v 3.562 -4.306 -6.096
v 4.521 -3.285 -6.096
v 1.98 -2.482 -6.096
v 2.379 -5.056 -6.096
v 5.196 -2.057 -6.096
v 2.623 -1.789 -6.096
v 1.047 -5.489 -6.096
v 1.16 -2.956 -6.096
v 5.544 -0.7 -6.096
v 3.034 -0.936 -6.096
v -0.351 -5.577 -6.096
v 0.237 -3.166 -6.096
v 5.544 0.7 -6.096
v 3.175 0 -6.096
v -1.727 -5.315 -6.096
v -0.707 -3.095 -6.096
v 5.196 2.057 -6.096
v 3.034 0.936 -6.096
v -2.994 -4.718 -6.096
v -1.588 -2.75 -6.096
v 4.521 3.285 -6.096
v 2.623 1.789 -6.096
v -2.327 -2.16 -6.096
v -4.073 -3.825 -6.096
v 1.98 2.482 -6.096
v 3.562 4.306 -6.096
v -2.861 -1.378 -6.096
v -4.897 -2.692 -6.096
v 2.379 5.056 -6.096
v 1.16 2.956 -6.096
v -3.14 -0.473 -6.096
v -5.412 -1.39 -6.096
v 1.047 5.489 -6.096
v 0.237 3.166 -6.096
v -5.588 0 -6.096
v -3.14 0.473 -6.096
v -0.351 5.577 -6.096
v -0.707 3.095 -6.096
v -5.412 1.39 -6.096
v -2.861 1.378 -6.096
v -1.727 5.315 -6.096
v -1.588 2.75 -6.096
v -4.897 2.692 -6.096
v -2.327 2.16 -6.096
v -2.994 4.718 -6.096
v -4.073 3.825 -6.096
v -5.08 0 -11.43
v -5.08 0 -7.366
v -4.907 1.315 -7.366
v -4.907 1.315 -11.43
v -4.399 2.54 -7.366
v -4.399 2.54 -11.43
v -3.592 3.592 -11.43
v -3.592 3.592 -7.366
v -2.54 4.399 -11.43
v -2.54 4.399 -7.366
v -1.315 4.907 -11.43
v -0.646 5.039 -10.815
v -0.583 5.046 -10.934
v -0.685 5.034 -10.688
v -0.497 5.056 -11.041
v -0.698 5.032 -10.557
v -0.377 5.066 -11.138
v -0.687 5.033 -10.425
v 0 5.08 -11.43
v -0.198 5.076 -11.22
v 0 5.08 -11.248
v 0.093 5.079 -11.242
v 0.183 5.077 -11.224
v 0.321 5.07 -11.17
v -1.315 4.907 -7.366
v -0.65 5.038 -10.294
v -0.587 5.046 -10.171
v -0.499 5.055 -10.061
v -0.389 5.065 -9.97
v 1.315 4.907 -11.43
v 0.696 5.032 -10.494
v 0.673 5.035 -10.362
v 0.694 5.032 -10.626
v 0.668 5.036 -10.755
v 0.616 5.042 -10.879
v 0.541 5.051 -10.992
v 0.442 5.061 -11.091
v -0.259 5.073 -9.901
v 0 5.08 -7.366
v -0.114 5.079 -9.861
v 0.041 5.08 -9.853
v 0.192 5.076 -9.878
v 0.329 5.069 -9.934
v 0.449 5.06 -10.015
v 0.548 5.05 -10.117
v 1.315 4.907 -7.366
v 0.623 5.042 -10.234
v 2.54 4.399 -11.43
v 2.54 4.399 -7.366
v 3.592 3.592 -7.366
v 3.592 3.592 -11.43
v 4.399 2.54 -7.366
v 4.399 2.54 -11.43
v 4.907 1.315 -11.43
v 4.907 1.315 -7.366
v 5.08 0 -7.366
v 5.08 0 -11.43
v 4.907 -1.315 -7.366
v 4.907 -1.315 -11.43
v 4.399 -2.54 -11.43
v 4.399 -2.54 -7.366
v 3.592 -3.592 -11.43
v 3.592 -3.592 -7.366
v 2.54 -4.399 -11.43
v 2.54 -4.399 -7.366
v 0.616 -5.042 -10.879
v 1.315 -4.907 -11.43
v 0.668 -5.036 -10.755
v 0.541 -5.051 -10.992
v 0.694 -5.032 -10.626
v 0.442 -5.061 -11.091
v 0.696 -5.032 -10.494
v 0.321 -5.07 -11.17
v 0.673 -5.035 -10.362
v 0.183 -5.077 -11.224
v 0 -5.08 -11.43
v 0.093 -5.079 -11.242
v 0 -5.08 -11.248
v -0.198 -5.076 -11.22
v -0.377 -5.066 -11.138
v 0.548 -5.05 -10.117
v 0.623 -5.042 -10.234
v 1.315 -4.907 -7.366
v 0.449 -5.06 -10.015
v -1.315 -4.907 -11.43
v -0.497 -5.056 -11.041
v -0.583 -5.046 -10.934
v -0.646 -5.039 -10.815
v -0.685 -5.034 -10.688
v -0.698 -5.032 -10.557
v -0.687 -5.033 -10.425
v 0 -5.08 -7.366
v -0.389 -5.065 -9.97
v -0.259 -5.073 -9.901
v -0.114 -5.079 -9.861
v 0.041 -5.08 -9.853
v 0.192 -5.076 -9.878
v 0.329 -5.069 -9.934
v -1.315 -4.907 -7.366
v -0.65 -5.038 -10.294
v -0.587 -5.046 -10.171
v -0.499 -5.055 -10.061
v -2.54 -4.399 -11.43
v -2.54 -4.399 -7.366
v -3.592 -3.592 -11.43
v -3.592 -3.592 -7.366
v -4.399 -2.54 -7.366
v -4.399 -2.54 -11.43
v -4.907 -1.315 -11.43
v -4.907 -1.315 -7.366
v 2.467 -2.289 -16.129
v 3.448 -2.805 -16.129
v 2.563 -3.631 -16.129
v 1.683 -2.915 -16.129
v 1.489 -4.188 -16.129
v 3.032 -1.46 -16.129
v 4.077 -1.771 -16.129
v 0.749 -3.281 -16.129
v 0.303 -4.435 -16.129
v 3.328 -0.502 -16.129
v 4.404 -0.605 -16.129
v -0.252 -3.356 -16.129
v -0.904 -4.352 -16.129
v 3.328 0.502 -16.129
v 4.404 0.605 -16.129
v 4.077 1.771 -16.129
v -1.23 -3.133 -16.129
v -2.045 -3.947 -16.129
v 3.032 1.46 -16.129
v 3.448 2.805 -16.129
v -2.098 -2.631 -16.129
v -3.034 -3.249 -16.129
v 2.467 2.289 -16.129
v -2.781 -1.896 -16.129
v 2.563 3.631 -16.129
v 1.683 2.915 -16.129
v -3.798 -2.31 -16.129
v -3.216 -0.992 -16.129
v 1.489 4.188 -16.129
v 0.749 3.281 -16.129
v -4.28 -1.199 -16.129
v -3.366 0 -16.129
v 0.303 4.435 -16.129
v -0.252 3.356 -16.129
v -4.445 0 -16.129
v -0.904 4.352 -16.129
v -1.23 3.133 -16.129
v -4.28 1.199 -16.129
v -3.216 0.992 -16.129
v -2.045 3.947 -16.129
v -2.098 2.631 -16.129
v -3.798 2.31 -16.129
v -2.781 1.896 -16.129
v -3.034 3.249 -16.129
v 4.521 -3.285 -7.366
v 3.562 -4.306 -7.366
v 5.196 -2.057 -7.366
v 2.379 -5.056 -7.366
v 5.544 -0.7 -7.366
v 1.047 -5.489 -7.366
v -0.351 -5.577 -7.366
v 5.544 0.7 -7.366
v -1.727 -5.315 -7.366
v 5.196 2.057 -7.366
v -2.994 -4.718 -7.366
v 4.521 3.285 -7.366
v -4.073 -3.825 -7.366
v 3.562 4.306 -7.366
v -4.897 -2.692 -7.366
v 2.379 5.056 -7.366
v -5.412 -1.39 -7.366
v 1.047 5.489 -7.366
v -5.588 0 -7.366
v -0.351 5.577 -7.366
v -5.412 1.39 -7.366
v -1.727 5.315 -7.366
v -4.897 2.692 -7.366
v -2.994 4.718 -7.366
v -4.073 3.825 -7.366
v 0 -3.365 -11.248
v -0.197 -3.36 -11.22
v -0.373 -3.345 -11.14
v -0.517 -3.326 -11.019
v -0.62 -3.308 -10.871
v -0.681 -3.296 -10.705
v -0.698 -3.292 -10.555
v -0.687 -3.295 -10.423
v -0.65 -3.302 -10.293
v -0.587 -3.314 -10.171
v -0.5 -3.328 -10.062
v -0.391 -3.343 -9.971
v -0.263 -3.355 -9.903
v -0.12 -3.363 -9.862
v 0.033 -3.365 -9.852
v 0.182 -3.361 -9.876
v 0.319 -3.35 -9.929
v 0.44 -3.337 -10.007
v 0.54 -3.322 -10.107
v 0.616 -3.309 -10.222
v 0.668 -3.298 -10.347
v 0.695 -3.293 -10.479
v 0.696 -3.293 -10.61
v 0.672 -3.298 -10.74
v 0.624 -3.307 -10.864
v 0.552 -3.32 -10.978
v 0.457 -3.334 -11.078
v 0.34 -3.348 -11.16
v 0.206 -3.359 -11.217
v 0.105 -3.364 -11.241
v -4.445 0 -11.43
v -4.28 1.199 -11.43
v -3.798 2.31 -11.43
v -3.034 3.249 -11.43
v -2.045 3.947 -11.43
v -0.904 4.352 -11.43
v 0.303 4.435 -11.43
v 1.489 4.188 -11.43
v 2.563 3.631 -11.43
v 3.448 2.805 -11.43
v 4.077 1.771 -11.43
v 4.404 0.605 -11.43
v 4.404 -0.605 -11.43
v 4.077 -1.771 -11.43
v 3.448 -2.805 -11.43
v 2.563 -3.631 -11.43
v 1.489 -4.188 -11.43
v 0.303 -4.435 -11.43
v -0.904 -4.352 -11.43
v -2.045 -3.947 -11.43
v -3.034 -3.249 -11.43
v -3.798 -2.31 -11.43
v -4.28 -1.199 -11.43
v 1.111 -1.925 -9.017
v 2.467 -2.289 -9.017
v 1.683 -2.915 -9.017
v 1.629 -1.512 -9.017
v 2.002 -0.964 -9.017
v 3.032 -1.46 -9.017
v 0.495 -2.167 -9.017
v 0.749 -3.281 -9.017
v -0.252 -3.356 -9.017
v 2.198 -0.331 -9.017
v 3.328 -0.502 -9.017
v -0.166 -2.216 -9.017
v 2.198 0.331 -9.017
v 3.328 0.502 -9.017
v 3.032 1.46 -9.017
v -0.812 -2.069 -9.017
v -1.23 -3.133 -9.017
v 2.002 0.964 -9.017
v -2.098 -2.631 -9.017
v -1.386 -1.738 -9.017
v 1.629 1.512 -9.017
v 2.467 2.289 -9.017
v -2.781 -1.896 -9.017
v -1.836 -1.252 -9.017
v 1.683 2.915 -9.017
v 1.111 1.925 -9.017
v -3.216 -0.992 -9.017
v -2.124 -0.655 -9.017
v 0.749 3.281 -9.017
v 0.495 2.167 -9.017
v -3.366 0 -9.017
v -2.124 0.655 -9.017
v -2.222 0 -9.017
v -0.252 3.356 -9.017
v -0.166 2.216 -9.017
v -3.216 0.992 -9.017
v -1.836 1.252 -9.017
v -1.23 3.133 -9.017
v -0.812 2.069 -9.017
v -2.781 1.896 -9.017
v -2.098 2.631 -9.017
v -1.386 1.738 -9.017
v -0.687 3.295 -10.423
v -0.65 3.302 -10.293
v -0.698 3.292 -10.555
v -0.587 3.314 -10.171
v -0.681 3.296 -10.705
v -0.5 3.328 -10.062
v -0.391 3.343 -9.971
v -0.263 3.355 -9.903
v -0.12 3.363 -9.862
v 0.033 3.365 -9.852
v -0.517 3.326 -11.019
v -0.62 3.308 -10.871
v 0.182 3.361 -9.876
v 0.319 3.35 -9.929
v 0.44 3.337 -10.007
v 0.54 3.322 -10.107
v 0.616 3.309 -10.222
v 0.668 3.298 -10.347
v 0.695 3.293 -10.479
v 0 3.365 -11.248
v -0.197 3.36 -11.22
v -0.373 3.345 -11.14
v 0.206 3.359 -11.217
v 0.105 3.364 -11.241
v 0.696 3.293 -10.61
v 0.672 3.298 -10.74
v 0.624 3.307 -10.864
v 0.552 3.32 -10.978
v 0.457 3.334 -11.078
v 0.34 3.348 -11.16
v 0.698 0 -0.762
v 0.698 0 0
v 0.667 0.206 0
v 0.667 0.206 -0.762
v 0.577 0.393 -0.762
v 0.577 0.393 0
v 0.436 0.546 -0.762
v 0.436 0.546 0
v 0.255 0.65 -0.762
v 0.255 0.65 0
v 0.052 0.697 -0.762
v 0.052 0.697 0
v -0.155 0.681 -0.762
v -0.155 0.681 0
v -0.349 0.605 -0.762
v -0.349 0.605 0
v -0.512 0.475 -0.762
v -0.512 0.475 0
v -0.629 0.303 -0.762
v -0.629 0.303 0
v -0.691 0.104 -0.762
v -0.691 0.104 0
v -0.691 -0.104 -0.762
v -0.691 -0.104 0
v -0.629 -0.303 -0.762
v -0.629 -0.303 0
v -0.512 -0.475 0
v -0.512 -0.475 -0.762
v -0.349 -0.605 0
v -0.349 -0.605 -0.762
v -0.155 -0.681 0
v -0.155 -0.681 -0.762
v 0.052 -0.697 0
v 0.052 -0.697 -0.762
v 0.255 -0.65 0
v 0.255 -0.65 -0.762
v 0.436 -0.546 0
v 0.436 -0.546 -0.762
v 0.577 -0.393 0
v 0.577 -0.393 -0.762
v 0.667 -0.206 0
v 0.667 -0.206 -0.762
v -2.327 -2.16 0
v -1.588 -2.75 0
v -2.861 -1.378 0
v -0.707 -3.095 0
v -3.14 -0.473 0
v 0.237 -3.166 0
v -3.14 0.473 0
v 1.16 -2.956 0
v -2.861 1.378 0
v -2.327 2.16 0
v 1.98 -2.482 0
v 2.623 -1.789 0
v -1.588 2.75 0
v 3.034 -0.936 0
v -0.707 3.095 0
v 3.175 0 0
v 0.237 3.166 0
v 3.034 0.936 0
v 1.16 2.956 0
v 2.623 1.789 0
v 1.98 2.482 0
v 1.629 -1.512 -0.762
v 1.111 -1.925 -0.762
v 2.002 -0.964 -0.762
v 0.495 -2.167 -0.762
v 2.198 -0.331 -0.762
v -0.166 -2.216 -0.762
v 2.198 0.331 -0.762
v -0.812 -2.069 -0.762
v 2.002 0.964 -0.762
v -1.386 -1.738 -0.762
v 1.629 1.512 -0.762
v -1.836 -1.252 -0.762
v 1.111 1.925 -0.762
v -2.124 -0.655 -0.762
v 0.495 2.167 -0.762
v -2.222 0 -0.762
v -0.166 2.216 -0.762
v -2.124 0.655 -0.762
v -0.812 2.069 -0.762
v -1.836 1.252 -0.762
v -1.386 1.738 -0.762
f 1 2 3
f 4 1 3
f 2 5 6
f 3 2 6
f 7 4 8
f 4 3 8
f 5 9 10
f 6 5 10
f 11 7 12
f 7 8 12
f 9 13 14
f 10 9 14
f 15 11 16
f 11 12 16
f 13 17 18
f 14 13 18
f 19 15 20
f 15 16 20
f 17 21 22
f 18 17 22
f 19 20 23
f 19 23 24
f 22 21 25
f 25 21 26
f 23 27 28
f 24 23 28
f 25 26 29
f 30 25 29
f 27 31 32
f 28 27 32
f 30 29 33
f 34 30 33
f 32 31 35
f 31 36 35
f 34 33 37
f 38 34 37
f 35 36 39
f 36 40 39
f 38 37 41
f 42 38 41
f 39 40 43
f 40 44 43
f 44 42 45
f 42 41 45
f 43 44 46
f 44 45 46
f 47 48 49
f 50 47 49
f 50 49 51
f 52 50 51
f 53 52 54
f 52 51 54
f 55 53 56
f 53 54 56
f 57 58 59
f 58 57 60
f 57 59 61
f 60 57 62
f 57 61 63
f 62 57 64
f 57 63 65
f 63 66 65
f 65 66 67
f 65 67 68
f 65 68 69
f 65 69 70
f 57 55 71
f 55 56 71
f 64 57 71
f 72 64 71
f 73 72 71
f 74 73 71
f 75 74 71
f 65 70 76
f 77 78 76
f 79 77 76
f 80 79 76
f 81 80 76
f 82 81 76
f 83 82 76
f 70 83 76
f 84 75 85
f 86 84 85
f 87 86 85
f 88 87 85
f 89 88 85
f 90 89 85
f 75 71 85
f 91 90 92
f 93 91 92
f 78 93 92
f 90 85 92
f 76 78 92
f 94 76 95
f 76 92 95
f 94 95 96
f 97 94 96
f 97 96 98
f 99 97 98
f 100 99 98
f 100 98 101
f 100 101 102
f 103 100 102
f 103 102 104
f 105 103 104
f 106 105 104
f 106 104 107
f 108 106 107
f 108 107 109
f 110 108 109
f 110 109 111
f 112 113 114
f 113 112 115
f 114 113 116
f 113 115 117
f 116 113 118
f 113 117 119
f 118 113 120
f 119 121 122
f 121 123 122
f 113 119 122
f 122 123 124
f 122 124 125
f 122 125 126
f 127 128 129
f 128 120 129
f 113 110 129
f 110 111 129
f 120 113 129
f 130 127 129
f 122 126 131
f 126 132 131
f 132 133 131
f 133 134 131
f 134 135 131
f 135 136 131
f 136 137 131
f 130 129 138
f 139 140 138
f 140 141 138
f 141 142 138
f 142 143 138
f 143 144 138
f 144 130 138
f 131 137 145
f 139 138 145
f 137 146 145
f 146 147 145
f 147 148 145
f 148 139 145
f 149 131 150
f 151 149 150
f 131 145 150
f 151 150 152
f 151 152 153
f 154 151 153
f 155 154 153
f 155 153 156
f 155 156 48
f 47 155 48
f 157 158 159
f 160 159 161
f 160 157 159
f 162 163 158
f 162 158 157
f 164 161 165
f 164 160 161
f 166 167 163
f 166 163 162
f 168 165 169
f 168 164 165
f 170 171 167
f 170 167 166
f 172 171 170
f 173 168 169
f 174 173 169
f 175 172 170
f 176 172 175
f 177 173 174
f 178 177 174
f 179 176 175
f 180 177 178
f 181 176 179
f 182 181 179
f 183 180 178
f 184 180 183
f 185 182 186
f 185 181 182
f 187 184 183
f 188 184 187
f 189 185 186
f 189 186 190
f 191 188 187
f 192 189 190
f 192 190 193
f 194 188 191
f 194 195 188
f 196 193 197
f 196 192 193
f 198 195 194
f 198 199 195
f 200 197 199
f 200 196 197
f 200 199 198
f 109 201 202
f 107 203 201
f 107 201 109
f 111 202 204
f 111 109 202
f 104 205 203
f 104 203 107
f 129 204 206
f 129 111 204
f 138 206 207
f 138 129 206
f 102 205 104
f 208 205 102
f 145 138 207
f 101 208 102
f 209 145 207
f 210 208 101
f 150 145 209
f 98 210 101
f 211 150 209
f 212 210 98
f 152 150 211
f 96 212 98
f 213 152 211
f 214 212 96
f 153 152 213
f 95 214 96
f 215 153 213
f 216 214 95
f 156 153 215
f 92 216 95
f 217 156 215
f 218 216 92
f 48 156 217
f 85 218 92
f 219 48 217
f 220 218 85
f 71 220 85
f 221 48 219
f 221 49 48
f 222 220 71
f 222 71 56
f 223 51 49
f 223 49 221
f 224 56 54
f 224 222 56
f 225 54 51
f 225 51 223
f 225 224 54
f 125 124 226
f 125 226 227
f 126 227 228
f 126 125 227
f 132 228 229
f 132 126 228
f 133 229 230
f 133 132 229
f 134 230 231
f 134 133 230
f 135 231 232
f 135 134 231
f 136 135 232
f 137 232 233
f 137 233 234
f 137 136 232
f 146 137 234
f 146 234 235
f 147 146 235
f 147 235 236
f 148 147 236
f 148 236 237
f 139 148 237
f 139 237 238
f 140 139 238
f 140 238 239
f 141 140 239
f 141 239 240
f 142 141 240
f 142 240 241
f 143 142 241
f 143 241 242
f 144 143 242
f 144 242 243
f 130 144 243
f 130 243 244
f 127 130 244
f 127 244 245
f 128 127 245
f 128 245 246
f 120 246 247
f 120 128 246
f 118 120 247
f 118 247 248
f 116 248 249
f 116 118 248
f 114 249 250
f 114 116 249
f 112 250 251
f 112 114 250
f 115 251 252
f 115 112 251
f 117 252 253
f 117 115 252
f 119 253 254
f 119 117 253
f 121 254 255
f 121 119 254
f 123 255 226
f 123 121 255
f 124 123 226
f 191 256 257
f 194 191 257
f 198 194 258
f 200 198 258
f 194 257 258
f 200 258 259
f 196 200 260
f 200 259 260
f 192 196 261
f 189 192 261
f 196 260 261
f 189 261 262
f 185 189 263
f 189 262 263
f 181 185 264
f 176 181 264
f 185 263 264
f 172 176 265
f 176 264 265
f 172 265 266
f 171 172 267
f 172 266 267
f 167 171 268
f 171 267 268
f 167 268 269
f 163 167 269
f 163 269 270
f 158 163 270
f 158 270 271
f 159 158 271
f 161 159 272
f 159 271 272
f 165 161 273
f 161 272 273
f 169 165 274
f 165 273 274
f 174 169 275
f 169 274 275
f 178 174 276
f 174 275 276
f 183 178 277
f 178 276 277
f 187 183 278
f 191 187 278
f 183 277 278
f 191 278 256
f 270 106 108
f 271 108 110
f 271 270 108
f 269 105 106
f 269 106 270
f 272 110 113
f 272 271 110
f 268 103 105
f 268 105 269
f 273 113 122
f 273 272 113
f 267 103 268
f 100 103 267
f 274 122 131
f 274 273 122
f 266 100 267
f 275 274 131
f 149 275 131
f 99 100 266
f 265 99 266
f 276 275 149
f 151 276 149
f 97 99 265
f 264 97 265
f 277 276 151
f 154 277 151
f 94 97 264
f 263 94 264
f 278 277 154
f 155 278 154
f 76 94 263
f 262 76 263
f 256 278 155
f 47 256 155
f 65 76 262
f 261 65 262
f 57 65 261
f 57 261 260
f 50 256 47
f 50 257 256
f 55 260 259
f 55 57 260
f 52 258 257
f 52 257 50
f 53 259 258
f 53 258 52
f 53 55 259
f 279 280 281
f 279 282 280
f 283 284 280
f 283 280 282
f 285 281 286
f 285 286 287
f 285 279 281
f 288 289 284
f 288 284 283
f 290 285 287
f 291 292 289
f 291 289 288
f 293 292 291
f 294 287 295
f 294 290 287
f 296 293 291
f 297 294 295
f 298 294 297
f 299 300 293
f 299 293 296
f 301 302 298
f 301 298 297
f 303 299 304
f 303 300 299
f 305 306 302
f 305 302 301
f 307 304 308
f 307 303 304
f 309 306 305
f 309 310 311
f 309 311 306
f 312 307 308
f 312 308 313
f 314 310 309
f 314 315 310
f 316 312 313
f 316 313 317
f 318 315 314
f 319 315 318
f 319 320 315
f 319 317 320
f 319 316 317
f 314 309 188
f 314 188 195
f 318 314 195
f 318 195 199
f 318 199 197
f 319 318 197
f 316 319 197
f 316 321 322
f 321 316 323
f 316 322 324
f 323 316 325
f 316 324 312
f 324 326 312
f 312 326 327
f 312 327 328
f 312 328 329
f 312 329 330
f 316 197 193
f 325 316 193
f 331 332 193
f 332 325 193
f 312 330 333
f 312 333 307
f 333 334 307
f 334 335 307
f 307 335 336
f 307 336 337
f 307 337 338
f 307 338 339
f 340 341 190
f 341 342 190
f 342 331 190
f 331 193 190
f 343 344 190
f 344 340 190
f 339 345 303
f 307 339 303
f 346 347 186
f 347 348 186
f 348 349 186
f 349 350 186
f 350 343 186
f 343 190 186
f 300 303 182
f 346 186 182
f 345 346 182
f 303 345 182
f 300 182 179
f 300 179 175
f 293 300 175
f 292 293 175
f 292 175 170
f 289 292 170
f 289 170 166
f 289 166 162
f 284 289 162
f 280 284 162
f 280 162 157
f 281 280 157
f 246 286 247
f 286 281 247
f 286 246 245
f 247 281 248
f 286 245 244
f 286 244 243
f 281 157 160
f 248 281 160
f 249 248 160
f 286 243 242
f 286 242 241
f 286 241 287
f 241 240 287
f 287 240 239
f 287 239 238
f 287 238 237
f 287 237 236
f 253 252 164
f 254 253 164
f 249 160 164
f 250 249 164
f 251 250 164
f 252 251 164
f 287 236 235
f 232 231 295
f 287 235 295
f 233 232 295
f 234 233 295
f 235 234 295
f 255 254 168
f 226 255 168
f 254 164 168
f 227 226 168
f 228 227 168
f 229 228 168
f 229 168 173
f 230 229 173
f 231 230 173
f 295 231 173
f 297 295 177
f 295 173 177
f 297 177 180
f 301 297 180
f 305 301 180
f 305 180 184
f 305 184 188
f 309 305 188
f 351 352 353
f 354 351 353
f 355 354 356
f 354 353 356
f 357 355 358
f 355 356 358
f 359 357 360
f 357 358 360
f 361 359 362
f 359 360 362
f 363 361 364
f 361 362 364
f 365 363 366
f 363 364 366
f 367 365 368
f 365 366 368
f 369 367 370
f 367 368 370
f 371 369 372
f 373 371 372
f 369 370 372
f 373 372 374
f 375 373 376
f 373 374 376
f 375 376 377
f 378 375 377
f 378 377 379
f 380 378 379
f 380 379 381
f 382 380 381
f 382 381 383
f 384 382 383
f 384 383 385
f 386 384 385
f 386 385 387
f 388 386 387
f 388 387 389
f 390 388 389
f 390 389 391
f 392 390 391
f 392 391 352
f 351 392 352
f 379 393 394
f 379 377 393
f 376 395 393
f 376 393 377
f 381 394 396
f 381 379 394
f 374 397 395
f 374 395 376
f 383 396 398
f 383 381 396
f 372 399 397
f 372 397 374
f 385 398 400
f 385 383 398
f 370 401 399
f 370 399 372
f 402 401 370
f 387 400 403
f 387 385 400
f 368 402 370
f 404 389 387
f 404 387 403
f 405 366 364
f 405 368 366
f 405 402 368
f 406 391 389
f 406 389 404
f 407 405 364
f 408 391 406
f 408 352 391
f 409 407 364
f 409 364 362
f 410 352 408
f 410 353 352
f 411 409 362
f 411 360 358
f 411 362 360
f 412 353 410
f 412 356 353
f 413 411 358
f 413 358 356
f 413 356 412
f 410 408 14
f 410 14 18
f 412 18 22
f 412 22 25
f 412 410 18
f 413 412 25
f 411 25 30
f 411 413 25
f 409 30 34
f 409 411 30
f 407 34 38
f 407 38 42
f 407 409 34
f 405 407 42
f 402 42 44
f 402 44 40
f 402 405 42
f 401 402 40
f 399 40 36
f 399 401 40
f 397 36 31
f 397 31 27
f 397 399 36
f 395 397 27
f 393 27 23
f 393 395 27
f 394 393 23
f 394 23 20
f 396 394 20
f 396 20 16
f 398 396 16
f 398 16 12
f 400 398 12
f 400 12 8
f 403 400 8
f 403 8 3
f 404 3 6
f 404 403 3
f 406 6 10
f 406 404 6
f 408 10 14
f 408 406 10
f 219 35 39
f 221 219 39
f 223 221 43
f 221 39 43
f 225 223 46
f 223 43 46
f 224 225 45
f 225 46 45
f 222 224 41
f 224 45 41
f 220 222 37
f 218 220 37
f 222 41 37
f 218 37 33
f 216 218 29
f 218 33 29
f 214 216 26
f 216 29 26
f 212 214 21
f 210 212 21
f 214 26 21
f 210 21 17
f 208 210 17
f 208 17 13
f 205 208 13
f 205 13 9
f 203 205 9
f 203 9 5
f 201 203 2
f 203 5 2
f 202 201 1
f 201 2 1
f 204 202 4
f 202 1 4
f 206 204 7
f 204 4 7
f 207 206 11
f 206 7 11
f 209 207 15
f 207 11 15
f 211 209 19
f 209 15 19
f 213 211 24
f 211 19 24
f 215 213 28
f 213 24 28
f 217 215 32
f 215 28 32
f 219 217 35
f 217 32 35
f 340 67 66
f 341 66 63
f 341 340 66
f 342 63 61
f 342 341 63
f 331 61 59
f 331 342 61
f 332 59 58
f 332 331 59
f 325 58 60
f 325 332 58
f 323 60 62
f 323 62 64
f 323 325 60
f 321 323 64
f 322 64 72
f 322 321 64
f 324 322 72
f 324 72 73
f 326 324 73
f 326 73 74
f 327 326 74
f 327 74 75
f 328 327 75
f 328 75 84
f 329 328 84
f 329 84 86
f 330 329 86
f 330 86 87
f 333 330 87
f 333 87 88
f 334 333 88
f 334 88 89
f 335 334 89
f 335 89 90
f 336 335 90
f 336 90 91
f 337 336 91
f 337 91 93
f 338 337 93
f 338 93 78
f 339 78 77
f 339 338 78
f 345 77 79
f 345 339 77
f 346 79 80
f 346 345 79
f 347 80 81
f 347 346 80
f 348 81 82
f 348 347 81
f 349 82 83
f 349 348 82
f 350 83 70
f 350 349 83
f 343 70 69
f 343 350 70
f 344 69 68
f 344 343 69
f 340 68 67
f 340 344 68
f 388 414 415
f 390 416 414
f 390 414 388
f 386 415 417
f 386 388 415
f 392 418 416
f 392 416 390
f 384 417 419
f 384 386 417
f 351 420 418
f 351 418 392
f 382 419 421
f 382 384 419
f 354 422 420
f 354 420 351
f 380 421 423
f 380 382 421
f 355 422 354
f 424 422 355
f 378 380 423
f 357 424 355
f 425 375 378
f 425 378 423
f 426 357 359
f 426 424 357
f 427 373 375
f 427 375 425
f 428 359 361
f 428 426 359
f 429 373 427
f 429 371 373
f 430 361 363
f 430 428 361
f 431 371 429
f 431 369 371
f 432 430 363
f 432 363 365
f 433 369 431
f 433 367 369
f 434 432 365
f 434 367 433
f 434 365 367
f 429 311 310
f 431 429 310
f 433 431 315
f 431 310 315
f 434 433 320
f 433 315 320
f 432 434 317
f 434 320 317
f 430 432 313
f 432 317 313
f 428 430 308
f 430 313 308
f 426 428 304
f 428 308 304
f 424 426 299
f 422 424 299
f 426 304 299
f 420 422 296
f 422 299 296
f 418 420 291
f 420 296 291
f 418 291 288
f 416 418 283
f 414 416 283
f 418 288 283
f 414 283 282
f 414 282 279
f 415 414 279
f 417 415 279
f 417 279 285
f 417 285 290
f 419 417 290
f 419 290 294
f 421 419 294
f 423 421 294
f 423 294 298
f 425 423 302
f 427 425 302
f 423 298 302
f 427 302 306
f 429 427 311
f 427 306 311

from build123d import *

# Parameters (mm, degrees)
SKETCH2_R               = 3.175
BOSS_EXTRUDE1_DEPTH     = 6.096
SKETCH3_R               = 5.588
BOSS_EXTRUDE2_DEPTH     = 1.27
SKETCH4_R               = 5.08
BOSS_EXTRUDE3_DEPTH     = 4.064
SKETCH5_R               = 4.445
BOSS_EXTRUDE4_DEPTH     = 4.699
SKETCH6_R               = 3.3655
CUT_EXTRUDE1_DEPTH      = 7.112
SKETCH7_R               = 2.2225
CUT_EXTRUDE2_DEPTH      = 8.255
SKETCH8_R               = 0.6985
CUT_EXTRUDE3_DEPTH      = 18.960961249
CUT_EXTRUDE4_DEPTH      = 8.255
CUT_EXTRUDE4_DEPTH_BACK = 8.255
SKETCH9_R               = 0.6985


with BuildPart() as part:
    # Sketch2 → Boss-Extrude1 (new body)
    with BuildSketch(Plane.XY):
        Circle(SKETCH2_R)
    extrude(amount=-BOSS_EXTRUDE1_DEPTH)

    # Sketch3 → Boss-Extrude2 (add)
    with BuildSketch(Plane(origin=(0, 0, -6.096), x_dir=(-1, 0, 0), z_dir=(0, 0, -1))):
        Circle(SKETCH3_R)
    extrude(amount=BOSS_EXTRUDE2_DEPTH)

    # Sketch4 → Boss-Extrude3 (add)
    with BuildSketch(Plane(origin=(0, 0, -7.366), x_dir=(-1, 0, 0), z_dir=(0, 0, -1))):
        Circle(SKETCH4_R)
    extrude(amount=BOSS_EXTRUDE3_DEPTH)

    # Sketch5 → Boss-Extrude4 (add)
    with BuildSketch(Plane(origin=(0, 0, -11.43), x_dir=(-1, 0, 0), z_dir=(0, 0, -1))):
        Circle(SKETCH5_R)
    extrude(amount=BOSS_EXTRUDE4_DEPTH)

    # Sketch6 → Cut-Extrude1 (cut)
    with BuildSketch(Plane(origin=(0, 0, -16.129), x_dir=(-1, 0, 0), z_dir=(0, 0, -1))):
        Circle(SKETCH6_R)
    extrude(amount=-CUT_EXTRUDE1_DEPTH, mode=Mode.SUBTRACT)

    # Sketch7 → Cut-Extrude2 (cut)
    with BuildSketch(Plane(origin=(0, 0, -9.017), x_dir=(-1, 0, 0), z_dir=(0, 0, -1))):
        Circle(SKETCH7_R)
    extrude(amount=-CUT_EXTRUDE2_DEPTH, mode=Mode.SUBTRACT)

    # Sketch8 → Cut-Extrude3 (cut, through all)
    with BuildSketch(Plane.XY):
        Circle(SKETCH8_R)
    extrude(amount=-CUT_EXTRUDE3_DEPTH, mode=Mode.SUBTRACT)

    # Sketch9 → Cut-Extrude4 (cut, two sides: drawn at the far end of the back side and taken through both)
    with BuildSketch(Plane(origin=(0, 0, 0), x_dir=(1, 0, 0), z_dir=(0, 1, 0)).offset(-CUT_EXTRUDE4_DEPTH_BACK)):
        with Locations((0, 10.549993494)):
            Circle(SKETCH9_R)
    extrude(amount=CUT_EXTRUDE4_DEPTH + CUT_EXTRUDE4_DEPTH_BACK, mode=Mode.SUBTRACT)


solid = part.part
